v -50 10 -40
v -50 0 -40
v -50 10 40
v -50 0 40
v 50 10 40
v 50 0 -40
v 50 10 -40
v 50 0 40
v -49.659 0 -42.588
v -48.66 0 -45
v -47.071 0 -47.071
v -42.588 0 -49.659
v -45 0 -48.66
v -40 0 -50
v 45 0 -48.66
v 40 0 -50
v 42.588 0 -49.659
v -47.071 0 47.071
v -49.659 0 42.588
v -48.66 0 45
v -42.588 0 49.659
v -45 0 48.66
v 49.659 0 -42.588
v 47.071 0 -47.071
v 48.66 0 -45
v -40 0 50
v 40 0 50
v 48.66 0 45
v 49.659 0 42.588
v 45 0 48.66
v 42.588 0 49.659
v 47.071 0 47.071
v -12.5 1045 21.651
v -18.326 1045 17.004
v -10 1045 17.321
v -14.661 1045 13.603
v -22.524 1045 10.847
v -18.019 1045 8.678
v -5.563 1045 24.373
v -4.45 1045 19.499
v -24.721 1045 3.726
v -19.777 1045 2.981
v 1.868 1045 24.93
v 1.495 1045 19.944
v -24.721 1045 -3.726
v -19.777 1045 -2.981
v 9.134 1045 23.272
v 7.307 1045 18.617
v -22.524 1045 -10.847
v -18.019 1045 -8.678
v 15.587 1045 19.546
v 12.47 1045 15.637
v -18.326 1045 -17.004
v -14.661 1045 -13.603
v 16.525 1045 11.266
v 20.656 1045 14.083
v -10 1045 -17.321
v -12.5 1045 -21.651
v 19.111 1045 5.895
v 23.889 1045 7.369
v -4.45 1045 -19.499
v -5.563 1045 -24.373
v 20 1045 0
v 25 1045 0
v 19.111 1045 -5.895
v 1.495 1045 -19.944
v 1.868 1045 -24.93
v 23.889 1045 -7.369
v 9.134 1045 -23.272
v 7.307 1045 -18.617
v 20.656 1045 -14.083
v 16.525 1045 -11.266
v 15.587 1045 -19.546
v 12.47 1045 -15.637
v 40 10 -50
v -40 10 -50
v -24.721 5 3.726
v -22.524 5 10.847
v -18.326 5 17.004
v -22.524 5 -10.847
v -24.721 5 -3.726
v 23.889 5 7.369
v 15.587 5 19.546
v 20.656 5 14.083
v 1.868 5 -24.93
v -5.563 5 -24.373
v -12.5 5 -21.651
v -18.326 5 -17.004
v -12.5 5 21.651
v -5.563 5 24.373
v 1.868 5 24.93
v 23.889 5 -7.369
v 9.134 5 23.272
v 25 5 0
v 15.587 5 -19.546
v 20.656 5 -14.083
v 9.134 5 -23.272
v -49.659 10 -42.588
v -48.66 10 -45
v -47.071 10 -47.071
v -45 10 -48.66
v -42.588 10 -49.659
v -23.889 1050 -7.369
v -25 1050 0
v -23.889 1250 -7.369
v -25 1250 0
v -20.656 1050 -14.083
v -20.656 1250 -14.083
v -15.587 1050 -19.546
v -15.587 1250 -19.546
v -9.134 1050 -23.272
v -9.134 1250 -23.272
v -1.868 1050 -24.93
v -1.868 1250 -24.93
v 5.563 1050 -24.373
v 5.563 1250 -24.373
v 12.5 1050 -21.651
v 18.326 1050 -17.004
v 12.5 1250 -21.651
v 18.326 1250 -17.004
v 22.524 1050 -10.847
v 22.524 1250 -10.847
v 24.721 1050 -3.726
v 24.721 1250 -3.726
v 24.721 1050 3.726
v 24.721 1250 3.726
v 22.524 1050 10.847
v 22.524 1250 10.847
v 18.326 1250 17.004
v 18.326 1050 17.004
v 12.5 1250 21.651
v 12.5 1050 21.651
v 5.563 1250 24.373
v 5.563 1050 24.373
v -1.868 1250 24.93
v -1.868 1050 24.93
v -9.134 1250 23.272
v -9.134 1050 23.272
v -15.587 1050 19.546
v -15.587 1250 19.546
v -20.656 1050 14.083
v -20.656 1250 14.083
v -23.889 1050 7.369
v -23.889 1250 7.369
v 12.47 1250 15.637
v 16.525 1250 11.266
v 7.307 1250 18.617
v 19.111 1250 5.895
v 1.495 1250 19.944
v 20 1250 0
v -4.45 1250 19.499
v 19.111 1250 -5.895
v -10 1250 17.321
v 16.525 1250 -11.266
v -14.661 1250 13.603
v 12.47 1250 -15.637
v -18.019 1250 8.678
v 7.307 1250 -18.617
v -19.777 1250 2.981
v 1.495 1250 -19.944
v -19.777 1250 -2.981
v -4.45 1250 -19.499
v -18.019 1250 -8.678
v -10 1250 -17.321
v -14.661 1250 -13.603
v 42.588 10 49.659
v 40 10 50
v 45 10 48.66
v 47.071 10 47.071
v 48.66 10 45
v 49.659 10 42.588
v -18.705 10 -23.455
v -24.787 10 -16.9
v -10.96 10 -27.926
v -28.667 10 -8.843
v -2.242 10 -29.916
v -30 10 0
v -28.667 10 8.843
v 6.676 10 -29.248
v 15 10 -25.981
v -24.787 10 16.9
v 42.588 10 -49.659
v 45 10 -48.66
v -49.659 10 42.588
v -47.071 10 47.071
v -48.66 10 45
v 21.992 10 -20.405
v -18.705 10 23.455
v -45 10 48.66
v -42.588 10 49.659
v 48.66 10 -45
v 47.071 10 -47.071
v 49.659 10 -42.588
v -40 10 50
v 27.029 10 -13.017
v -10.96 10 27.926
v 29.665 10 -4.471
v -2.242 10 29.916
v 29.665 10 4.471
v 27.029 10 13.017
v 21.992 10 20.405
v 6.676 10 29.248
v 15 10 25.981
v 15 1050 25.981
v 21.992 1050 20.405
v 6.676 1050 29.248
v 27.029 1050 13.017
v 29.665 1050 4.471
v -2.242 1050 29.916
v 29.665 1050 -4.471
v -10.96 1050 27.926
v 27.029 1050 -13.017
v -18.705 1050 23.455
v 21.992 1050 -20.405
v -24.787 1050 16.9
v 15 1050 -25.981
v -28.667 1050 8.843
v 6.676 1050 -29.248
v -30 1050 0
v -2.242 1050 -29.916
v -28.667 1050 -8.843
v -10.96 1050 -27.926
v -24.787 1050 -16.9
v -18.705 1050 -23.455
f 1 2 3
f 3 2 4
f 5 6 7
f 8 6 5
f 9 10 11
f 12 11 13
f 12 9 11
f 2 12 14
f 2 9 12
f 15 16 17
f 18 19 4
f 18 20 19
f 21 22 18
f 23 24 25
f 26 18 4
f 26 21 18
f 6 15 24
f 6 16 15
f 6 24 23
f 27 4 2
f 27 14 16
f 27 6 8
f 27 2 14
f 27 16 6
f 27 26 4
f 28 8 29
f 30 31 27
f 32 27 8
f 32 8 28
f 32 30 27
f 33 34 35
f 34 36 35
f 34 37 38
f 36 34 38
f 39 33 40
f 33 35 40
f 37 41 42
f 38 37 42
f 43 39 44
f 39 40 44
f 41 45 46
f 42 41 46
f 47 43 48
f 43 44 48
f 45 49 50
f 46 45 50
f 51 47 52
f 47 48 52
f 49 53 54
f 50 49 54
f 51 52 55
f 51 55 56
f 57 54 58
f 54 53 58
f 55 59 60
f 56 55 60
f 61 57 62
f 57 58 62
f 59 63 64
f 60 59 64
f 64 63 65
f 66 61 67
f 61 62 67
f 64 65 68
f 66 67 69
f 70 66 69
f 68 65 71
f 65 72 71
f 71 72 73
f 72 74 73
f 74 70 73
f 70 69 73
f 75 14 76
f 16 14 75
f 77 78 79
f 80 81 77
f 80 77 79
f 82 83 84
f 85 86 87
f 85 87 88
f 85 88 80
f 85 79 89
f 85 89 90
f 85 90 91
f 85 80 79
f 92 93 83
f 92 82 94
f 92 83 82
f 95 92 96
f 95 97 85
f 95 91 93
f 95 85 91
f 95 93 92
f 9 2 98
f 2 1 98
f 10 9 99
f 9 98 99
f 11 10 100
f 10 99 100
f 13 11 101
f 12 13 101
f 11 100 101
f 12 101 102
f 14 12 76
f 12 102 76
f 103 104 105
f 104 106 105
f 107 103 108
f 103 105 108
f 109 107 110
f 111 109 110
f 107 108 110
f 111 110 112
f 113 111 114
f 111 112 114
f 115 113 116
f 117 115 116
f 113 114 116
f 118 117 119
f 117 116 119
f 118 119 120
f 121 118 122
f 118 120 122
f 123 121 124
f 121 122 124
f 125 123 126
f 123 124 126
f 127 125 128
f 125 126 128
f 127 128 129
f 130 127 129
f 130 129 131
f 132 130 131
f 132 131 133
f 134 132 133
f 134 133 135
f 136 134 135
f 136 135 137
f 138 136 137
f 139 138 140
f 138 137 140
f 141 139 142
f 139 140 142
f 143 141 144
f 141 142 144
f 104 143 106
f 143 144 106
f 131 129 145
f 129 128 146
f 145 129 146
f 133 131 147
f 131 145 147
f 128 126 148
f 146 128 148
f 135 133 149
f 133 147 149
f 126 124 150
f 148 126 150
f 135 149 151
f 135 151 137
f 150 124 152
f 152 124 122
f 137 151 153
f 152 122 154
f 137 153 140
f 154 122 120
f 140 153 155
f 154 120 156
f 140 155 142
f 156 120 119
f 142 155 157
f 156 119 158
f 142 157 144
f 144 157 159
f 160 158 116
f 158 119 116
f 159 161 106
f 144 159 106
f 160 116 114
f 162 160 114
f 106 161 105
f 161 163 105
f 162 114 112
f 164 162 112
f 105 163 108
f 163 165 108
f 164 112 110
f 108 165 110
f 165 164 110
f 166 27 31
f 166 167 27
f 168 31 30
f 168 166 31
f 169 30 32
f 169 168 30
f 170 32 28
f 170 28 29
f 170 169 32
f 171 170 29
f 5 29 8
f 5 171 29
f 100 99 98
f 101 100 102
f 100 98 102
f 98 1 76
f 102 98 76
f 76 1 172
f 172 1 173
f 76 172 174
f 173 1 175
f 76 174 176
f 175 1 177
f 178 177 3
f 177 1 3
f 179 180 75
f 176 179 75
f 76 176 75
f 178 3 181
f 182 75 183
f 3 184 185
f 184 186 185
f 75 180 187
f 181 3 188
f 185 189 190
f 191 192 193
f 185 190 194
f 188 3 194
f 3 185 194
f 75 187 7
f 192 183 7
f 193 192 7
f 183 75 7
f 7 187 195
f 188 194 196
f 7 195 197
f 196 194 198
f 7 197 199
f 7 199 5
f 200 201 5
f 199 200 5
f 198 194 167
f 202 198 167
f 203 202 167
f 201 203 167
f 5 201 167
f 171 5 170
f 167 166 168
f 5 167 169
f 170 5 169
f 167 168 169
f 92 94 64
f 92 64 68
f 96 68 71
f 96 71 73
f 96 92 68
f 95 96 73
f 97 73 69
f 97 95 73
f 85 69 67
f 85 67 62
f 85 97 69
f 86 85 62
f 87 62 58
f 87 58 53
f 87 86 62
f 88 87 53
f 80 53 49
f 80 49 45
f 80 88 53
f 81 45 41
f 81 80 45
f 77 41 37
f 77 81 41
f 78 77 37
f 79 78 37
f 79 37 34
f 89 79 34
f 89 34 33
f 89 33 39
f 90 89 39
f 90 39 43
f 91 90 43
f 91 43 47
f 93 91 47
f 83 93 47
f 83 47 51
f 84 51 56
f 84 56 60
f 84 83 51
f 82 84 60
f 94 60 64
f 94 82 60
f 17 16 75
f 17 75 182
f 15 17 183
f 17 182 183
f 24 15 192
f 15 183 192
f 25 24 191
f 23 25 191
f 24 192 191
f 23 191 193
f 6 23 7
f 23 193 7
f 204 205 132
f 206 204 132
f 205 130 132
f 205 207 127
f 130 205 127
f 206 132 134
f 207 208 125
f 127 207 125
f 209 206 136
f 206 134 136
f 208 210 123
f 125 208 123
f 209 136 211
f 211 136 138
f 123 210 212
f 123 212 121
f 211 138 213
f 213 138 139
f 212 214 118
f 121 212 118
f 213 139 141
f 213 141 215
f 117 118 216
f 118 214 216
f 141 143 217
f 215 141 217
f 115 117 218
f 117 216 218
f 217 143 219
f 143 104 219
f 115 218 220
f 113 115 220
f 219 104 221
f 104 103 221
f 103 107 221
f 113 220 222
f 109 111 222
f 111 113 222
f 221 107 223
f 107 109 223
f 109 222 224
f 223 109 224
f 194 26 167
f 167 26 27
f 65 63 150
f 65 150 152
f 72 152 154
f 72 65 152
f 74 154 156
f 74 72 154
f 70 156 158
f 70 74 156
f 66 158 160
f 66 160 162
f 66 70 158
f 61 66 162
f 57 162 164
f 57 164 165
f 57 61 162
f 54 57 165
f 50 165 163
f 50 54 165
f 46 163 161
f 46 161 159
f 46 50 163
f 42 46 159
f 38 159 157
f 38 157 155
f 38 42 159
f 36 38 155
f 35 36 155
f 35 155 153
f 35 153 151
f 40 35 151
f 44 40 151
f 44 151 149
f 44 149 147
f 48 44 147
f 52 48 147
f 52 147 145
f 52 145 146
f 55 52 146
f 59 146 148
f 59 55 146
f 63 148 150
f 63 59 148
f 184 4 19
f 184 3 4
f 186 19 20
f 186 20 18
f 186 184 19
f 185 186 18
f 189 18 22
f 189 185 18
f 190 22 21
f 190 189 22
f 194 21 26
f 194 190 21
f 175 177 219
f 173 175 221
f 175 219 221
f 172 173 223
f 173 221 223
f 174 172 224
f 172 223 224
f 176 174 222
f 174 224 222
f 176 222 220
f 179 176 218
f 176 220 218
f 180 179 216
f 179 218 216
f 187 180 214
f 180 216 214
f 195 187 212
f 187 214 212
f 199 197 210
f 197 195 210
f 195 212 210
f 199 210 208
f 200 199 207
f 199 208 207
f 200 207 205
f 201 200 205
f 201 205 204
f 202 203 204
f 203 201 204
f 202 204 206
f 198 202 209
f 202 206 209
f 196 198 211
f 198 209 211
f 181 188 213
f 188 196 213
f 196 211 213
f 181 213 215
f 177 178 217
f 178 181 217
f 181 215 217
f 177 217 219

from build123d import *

# Parameters (mm, degrees)
SKETCH_2_W          = 100
SKETCH_2_H          = 100
EXTRUDE_1_DEPTH     = 10
FILLET_1_R          = 10
SHELL_START         = 5
SHELL_1_OUTLINE_R   = 25
SHELL_1_DEPTH       = 1040
SHELL_START_2       = 1045
SHELL_1_2_OUTLINE_R = 20
SHELL_1_2_DEPTH     = 205


# Read off the part's stored shape, not the designer's step: 抽壳1
with BuildPart() as part:
    # 草图1 → 旋转1 (revolve)
    with BuildSketch(Plane.XY, mode=Mode.PRIVATE) as revolve_1_sk:
        Polygon((0, 0), (30, 0), (30, 1050), (25, 1050), (25, 1250), (0, 1250), align=None)
    revolve(revolve_1_sk.sketch.rotate(Axis((0, 1250, 0), (0, -1, 0)), 180), axis=Axis((0, 1250, 0), (0, -1, 0)))

    # 草图2 → 凸台-拉伸1 (add)
    with BuildSketch(Plane.XZ):
        Rectangle(SKETCH_2_W, SKETCH_2_H)
    extrude(amount=-EXTRUDE_1_DEPTH)

    # 圆角1
    fillet_1_edges = [part.edges().sort_by_distance(p)[0] for p in [
        (50, 5, 50),
        (50, 5, -50),
        (-50, 5, -50),
        (-50, 5, 50),
    ]]
    fillet(fillet_1_edges, radius=FILLET_1_R)

    # 抽壳1 outline → 抽壳1 (cut)
    with BuildSketch(Plane(origin=(0, 0, 0), x_dir=(1, 0, 0), z_dir=(0, 1, 0)).offset(SHELL_START)):
        Circle(SHELL_1_OUTLINE_R)
    extrude(amount=SHELL_1_DEPTH, mode=Mode.SUBTRACT)

    # Shell 1 2 outline → Shell 1 2 (cut)
    with BuildSketch(Plane(origin=(0, 0, 0), x_dir=(1, 0, 0), z_dir=(0, 1, 0)).offset(SHELL_START_2)):
        Circle(SHELL_1_2_OUTLINE_R)
    extrude(amount=SHELL_1_2_DEPTH, mode=Mode.SUBTRACT)


solid = part.part
